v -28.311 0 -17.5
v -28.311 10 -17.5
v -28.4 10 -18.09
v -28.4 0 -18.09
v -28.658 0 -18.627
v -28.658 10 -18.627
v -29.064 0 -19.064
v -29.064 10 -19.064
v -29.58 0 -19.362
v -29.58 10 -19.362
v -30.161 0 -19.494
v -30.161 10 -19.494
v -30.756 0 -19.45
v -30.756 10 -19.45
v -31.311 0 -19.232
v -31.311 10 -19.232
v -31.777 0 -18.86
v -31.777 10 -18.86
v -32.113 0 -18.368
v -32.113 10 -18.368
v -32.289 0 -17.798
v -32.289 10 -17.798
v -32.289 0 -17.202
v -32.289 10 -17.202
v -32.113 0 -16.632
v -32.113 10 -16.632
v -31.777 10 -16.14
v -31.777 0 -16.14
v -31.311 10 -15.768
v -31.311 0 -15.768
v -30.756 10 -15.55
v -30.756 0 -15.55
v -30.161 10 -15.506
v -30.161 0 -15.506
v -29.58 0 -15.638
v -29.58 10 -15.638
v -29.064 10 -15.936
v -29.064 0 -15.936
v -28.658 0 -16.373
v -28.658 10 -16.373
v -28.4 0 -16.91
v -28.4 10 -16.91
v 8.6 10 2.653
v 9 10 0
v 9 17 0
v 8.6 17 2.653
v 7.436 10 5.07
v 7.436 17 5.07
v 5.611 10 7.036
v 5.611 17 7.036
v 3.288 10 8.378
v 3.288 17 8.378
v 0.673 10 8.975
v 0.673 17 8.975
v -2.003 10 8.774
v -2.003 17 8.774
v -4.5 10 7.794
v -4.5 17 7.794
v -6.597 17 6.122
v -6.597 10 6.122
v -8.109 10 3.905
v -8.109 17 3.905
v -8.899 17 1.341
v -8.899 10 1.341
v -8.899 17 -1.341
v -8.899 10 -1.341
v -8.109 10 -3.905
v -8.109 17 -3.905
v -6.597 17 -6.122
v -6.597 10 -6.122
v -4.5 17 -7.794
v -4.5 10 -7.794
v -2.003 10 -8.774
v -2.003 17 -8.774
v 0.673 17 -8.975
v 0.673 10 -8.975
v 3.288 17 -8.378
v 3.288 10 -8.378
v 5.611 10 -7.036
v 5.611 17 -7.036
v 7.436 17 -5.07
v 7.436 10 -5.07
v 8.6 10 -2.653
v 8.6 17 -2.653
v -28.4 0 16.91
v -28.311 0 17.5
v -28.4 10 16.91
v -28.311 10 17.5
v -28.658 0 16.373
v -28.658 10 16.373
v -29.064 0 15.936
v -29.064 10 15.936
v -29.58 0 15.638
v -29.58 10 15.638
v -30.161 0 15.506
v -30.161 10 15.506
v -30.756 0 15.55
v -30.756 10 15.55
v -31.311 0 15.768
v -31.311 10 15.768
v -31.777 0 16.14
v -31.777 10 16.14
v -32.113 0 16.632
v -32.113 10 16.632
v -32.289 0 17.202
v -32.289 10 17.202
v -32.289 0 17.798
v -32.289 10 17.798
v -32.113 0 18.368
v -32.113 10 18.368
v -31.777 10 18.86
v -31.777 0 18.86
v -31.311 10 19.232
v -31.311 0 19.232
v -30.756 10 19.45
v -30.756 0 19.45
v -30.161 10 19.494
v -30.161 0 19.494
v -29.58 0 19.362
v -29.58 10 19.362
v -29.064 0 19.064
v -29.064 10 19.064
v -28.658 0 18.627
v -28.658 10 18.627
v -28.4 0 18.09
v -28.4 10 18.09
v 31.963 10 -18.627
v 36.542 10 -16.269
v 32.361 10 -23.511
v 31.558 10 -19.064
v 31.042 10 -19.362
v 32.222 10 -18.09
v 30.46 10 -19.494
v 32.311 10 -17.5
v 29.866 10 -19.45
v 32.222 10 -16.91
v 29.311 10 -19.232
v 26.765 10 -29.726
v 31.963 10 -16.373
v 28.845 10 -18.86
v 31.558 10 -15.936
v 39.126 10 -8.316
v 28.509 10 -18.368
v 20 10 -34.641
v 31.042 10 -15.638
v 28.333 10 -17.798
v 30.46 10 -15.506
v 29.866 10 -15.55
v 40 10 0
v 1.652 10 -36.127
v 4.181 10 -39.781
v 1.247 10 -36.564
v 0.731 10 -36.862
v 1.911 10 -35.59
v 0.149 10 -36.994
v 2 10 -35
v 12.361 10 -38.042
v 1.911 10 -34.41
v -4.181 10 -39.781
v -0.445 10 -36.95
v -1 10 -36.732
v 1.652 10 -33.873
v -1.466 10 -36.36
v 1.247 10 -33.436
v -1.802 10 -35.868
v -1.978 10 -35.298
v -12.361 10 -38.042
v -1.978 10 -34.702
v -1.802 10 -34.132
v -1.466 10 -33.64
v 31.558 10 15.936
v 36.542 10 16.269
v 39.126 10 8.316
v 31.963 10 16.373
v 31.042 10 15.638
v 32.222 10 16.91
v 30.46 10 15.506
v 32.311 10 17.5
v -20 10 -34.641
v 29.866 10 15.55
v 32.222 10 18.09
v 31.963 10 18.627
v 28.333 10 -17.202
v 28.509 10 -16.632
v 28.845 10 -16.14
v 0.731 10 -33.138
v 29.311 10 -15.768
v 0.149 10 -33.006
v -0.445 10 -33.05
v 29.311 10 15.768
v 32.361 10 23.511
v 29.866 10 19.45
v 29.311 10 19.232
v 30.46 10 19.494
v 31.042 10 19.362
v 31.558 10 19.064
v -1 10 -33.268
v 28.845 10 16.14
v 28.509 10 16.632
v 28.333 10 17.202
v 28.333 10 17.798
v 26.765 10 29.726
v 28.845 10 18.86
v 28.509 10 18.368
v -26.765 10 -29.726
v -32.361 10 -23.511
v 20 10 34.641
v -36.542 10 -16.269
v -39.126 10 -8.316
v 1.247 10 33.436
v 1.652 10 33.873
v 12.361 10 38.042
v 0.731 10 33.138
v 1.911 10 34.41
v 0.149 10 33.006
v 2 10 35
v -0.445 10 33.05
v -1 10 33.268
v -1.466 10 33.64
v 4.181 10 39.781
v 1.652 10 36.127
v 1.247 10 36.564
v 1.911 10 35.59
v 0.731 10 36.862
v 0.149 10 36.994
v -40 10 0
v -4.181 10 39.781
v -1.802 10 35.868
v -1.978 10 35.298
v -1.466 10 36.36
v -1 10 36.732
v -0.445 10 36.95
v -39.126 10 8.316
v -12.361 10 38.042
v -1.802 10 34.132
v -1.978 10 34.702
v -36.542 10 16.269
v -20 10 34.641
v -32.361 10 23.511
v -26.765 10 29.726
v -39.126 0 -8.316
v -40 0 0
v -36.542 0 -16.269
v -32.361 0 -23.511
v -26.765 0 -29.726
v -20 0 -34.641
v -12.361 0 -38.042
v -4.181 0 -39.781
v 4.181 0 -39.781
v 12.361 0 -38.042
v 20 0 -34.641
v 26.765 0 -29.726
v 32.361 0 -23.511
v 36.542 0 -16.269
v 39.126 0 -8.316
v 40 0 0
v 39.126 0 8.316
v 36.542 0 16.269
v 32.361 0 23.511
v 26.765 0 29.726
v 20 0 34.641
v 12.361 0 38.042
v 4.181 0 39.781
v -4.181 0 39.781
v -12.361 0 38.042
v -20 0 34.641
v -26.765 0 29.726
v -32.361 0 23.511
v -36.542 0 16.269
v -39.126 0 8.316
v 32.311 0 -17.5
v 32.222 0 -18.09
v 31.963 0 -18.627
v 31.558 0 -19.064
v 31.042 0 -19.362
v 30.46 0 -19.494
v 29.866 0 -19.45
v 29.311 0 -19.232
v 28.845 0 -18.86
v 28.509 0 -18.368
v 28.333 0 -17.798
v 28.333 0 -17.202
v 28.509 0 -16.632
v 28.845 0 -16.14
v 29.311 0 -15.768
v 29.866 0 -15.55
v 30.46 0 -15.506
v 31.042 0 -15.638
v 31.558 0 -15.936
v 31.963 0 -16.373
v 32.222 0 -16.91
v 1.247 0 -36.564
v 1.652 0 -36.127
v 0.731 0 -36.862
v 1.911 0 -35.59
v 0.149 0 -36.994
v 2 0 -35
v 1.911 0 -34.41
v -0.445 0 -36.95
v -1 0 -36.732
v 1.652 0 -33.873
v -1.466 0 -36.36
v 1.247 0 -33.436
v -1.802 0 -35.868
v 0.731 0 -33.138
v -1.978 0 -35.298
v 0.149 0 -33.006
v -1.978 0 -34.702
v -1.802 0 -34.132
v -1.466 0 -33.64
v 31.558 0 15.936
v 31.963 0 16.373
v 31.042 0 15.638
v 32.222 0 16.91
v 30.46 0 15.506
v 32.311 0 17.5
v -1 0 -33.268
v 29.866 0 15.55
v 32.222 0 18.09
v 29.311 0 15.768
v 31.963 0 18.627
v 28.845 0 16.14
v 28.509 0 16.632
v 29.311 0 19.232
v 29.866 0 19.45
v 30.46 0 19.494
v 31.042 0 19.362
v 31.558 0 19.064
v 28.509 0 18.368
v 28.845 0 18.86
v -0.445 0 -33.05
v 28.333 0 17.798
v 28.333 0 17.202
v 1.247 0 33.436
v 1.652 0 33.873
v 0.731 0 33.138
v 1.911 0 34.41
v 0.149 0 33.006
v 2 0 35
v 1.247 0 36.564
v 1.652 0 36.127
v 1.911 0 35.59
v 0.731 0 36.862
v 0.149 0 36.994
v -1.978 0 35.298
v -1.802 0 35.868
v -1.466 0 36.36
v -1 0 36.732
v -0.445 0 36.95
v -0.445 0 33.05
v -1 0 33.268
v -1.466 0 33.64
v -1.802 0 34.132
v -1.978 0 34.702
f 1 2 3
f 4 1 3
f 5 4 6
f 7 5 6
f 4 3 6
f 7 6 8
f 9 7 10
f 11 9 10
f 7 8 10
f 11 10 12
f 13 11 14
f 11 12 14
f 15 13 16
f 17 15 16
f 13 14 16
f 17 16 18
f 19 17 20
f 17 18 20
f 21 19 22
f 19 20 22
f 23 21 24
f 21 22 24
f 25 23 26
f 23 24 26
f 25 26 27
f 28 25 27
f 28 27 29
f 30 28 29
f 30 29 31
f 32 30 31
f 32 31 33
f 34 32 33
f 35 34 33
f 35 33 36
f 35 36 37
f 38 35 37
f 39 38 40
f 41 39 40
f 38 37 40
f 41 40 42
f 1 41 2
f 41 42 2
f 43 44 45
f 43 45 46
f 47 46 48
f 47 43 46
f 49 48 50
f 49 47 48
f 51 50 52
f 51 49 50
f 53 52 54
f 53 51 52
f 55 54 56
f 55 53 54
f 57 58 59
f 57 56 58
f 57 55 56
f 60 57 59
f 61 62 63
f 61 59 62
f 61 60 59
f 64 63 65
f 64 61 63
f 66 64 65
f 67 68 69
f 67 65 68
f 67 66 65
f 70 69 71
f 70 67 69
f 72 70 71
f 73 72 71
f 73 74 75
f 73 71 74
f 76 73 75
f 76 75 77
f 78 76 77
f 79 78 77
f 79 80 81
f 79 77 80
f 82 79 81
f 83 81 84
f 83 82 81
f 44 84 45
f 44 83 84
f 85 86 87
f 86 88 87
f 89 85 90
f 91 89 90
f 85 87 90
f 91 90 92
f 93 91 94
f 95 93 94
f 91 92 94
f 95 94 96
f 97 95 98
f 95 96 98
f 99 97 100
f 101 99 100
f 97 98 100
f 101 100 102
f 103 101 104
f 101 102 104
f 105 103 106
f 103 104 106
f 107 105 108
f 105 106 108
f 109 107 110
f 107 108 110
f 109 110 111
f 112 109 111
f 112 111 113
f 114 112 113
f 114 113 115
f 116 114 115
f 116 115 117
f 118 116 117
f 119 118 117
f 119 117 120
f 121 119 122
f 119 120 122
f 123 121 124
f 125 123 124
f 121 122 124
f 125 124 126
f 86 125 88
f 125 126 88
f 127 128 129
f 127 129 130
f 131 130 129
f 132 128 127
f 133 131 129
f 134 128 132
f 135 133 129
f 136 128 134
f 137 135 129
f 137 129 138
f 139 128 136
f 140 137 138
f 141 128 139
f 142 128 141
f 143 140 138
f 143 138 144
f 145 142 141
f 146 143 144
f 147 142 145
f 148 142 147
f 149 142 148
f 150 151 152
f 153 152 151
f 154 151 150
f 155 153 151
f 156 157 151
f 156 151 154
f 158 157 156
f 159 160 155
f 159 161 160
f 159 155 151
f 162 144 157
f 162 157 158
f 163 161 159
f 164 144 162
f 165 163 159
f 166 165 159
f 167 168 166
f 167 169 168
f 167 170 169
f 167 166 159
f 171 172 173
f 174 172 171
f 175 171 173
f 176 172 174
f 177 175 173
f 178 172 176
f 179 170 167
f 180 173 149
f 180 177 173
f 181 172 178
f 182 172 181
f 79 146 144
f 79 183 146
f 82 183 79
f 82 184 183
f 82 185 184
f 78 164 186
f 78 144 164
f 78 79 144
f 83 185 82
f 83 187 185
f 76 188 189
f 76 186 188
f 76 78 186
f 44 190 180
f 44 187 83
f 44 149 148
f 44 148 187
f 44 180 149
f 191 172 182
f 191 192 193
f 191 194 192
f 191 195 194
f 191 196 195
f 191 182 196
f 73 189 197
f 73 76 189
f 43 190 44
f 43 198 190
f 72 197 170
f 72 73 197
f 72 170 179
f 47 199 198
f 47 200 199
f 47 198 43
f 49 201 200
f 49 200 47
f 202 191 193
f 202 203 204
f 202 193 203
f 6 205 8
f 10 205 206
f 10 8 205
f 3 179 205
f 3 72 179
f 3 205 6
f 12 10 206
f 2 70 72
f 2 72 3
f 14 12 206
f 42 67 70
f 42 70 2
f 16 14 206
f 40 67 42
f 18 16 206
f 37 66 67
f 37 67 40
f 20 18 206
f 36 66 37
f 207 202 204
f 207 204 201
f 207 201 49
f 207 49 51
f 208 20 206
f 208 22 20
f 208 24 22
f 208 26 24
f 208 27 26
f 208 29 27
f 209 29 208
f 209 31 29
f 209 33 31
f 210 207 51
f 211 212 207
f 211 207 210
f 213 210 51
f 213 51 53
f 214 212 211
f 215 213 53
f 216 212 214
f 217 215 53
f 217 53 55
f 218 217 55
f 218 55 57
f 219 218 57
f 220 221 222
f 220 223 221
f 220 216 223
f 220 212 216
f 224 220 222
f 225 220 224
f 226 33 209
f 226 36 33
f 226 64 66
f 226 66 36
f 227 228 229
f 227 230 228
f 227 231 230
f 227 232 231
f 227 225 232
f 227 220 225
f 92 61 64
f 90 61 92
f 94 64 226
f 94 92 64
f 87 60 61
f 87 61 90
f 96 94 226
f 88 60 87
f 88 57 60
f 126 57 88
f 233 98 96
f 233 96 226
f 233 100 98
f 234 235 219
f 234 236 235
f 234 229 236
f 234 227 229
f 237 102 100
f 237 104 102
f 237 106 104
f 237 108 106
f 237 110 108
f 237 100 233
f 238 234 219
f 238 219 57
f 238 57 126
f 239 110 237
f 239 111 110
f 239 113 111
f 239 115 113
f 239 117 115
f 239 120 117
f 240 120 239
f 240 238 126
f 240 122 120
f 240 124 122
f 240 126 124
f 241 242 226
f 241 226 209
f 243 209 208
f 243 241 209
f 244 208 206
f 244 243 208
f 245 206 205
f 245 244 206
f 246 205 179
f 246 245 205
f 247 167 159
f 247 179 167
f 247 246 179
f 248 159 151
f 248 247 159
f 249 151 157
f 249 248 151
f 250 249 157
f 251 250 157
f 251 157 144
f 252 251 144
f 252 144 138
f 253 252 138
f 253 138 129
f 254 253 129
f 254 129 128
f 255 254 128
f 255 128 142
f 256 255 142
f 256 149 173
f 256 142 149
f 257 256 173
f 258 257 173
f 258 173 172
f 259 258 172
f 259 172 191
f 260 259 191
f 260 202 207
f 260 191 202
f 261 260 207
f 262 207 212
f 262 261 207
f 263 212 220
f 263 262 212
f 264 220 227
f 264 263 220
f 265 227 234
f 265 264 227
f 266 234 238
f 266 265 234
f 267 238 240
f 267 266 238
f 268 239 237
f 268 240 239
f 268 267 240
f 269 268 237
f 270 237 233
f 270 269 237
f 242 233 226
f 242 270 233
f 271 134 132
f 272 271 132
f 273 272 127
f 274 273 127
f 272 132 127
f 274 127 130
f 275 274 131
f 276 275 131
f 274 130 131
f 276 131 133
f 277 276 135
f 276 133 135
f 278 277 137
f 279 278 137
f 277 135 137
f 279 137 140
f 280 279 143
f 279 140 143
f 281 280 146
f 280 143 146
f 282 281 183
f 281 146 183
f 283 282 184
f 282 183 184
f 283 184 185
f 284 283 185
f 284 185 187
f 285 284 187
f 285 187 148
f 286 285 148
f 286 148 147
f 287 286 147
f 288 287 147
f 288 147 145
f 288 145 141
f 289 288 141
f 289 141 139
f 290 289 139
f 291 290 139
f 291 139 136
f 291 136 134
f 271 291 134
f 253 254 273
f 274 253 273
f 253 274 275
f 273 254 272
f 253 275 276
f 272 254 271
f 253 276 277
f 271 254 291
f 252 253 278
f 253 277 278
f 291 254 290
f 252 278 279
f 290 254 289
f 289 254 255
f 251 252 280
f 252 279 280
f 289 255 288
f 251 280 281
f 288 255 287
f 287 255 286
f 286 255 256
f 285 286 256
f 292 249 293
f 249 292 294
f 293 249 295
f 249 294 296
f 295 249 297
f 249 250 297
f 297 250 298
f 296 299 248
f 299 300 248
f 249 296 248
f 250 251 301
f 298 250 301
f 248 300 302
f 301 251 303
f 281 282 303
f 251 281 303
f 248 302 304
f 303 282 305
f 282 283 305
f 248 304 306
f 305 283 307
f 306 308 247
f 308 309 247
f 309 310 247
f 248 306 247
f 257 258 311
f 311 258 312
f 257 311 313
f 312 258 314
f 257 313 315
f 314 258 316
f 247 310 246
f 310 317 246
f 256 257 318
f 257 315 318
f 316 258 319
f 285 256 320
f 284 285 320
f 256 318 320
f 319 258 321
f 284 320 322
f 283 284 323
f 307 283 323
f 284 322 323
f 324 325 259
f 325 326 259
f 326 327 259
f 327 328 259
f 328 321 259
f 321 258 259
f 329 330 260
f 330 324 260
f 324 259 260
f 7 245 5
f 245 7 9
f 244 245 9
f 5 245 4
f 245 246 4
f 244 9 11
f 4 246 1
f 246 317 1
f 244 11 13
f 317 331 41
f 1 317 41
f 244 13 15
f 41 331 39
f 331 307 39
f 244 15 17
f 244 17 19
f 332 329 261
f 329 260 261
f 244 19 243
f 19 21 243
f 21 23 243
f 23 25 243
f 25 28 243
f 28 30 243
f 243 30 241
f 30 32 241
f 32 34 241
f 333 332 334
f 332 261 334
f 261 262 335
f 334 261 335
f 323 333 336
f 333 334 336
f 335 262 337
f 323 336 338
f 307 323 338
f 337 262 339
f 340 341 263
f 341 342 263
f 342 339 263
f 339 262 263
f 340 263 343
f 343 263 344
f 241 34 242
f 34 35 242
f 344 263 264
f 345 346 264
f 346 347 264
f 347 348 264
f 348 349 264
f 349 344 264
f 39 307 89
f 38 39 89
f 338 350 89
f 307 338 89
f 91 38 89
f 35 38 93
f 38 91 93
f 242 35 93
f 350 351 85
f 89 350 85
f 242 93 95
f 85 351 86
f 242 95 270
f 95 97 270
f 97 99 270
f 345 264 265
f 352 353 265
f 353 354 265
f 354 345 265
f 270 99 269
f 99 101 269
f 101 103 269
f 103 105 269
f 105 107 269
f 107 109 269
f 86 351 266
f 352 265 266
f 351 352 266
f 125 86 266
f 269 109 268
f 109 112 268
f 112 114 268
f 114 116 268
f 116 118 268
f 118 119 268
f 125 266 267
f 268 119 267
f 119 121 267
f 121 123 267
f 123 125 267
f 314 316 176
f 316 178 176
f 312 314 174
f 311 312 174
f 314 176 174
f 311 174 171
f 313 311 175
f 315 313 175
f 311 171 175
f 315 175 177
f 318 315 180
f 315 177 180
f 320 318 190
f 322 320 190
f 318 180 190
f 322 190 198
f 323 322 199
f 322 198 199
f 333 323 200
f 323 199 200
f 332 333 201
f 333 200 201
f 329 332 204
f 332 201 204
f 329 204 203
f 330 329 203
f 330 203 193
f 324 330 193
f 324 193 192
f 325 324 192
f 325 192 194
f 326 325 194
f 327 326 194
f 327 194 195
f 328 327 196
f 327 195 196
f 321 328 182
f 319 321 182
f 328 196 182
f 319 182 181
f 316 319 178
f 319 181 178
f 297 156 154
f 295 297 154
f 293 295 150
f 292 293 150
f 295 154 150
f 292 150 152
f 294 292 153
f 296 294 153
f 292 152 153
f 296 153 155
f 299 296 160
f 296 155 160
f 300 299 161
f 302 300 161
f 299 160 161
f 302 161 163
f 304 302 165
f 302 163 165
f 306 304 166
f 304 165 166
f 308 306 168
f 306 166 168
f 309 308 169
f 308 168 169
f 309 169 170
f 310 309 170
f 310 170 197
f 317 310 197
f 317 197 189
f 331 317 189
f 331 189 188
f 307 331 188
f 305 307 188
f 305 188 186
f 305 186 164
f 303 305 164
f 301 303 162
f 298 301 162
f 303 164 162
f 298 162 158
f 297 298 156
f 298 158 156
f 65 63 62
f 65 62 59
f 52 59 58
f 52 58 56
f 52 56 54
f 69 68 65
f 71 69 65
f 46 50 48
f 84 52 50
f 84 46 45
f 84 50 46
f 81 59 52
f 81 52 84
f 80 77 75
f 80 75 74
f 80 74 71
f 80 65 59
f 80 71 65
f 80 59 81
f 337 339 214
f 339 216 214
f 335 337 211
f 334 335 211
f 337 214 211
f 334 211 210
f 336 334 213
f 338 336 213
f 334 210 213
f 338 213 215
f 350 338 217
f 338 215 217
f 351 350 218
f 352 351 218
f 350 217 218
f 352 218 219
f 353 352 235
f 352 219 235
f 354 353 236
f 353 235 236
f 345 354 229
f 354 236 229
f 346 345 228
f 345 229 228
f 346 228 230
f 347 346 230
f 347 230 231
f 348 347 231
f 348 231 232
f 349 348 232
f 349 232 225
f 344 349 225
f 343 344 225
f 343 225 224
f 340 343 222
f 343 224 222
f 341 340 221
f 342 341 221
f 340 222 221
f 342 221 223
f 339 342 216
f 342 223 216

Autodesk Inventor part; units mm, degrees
ref_plane "YZ Plane" through (0, 0, 0) normal (1, 0, 0) x (0, 1, 0)
ref_plane "XZ Plane" through (0, 0, 0) normal (0, 1, 0) x (-1, 0, 0)
ref_plane "XY Plane" through (0, 0, 0) normal (0, 0, 1) x (1, 0, 0)
sketch "Sketch1" plane through (0, 0, 0) normal (0, 1, 0) x (-1, 0, 0)
  circle A0 centre (0, 0) radius 40
  line L0 (0, 40) -> (40, 40) construction
  line L1 (0, 0) -> (0, 7.8266) construction
  line L2 (0, 0) -> (7.0888, 0) construction
  dimension "d0" = 80
extrude "Extrusion1" add sketch "Sketch1" along normal blind 10
sketch "Sketch2" plane through (0, 10, 0) normal (0, 1, 0) x (1, 0, 0)
  circle A0 centre (0, 0) radius 40 projected
  line L0 (0, -40) -> (-40, -40) construction
  line L1 (0, 0) -> (0, 3.1787) construction
  line L2 (0, 0) -> (-7.099, 0) construction
  line L3 (0, 0) -> (-40, -40)
  line L4 (0, 0) -> (40, -40)
  line L5 (0, 0) -> (-40, 40)
  line L6 (0, 0) -> (40, 40)
  circle A1 centre (0, 0) radius 40 construction
  line L7 (-28.2843, -28.2843) -> (-24.7487, -24.7487) construction
  circle A2 centre (0, 0) radius 35 construction
  circle A3 centre (-35, 0) radius 2
  circle A4 centre (-30.3109, -17.5) radius 2
  circle A5 centre (-17.5, -30.3109) radius 2
  circle A6 centre (0, -35) radius 2
  circle A7 centre (17.5, -30.3109) radius 2
  circle A8 centre (30.3109, -17.5) radius 2
  circle A9 centre (35, 0) radius 2
  circle A10 centre (30.3109, 17.5) radius 2
  circle A11 centre (17.5, 30.3109) radius 2
  circle A12 centre (0, 35) radius 2
  circle A13 centre (-17.5, 30.3109) radius 2
  circle A14 centre (-30.3109, 17.5) radius 2
  dimension "d4" = 5
  dimension "d5" = 4
  dimension "d8" = 360
extrude "Extrusion2" cut sketch "Sketch2" against normal through all contours A4 | A6 | A8 | A10 | A12 | A14
sketch "Sketch3" plane through (0, 0, 0) normal (0, -1, 0) x (1, 0, 0)
  point P0 (0, 0)
sketch "Sketch4" plane through (0, 10, 0) normal (0, 1, 0) x (1, 0, 0)
  circle A0 centre (0, 0) radius 9
  dimension "d12" = 18
extrude "Extrusion3" add sketch "Sketch4" along normal blind 7
properties part number "magnet bottom"
